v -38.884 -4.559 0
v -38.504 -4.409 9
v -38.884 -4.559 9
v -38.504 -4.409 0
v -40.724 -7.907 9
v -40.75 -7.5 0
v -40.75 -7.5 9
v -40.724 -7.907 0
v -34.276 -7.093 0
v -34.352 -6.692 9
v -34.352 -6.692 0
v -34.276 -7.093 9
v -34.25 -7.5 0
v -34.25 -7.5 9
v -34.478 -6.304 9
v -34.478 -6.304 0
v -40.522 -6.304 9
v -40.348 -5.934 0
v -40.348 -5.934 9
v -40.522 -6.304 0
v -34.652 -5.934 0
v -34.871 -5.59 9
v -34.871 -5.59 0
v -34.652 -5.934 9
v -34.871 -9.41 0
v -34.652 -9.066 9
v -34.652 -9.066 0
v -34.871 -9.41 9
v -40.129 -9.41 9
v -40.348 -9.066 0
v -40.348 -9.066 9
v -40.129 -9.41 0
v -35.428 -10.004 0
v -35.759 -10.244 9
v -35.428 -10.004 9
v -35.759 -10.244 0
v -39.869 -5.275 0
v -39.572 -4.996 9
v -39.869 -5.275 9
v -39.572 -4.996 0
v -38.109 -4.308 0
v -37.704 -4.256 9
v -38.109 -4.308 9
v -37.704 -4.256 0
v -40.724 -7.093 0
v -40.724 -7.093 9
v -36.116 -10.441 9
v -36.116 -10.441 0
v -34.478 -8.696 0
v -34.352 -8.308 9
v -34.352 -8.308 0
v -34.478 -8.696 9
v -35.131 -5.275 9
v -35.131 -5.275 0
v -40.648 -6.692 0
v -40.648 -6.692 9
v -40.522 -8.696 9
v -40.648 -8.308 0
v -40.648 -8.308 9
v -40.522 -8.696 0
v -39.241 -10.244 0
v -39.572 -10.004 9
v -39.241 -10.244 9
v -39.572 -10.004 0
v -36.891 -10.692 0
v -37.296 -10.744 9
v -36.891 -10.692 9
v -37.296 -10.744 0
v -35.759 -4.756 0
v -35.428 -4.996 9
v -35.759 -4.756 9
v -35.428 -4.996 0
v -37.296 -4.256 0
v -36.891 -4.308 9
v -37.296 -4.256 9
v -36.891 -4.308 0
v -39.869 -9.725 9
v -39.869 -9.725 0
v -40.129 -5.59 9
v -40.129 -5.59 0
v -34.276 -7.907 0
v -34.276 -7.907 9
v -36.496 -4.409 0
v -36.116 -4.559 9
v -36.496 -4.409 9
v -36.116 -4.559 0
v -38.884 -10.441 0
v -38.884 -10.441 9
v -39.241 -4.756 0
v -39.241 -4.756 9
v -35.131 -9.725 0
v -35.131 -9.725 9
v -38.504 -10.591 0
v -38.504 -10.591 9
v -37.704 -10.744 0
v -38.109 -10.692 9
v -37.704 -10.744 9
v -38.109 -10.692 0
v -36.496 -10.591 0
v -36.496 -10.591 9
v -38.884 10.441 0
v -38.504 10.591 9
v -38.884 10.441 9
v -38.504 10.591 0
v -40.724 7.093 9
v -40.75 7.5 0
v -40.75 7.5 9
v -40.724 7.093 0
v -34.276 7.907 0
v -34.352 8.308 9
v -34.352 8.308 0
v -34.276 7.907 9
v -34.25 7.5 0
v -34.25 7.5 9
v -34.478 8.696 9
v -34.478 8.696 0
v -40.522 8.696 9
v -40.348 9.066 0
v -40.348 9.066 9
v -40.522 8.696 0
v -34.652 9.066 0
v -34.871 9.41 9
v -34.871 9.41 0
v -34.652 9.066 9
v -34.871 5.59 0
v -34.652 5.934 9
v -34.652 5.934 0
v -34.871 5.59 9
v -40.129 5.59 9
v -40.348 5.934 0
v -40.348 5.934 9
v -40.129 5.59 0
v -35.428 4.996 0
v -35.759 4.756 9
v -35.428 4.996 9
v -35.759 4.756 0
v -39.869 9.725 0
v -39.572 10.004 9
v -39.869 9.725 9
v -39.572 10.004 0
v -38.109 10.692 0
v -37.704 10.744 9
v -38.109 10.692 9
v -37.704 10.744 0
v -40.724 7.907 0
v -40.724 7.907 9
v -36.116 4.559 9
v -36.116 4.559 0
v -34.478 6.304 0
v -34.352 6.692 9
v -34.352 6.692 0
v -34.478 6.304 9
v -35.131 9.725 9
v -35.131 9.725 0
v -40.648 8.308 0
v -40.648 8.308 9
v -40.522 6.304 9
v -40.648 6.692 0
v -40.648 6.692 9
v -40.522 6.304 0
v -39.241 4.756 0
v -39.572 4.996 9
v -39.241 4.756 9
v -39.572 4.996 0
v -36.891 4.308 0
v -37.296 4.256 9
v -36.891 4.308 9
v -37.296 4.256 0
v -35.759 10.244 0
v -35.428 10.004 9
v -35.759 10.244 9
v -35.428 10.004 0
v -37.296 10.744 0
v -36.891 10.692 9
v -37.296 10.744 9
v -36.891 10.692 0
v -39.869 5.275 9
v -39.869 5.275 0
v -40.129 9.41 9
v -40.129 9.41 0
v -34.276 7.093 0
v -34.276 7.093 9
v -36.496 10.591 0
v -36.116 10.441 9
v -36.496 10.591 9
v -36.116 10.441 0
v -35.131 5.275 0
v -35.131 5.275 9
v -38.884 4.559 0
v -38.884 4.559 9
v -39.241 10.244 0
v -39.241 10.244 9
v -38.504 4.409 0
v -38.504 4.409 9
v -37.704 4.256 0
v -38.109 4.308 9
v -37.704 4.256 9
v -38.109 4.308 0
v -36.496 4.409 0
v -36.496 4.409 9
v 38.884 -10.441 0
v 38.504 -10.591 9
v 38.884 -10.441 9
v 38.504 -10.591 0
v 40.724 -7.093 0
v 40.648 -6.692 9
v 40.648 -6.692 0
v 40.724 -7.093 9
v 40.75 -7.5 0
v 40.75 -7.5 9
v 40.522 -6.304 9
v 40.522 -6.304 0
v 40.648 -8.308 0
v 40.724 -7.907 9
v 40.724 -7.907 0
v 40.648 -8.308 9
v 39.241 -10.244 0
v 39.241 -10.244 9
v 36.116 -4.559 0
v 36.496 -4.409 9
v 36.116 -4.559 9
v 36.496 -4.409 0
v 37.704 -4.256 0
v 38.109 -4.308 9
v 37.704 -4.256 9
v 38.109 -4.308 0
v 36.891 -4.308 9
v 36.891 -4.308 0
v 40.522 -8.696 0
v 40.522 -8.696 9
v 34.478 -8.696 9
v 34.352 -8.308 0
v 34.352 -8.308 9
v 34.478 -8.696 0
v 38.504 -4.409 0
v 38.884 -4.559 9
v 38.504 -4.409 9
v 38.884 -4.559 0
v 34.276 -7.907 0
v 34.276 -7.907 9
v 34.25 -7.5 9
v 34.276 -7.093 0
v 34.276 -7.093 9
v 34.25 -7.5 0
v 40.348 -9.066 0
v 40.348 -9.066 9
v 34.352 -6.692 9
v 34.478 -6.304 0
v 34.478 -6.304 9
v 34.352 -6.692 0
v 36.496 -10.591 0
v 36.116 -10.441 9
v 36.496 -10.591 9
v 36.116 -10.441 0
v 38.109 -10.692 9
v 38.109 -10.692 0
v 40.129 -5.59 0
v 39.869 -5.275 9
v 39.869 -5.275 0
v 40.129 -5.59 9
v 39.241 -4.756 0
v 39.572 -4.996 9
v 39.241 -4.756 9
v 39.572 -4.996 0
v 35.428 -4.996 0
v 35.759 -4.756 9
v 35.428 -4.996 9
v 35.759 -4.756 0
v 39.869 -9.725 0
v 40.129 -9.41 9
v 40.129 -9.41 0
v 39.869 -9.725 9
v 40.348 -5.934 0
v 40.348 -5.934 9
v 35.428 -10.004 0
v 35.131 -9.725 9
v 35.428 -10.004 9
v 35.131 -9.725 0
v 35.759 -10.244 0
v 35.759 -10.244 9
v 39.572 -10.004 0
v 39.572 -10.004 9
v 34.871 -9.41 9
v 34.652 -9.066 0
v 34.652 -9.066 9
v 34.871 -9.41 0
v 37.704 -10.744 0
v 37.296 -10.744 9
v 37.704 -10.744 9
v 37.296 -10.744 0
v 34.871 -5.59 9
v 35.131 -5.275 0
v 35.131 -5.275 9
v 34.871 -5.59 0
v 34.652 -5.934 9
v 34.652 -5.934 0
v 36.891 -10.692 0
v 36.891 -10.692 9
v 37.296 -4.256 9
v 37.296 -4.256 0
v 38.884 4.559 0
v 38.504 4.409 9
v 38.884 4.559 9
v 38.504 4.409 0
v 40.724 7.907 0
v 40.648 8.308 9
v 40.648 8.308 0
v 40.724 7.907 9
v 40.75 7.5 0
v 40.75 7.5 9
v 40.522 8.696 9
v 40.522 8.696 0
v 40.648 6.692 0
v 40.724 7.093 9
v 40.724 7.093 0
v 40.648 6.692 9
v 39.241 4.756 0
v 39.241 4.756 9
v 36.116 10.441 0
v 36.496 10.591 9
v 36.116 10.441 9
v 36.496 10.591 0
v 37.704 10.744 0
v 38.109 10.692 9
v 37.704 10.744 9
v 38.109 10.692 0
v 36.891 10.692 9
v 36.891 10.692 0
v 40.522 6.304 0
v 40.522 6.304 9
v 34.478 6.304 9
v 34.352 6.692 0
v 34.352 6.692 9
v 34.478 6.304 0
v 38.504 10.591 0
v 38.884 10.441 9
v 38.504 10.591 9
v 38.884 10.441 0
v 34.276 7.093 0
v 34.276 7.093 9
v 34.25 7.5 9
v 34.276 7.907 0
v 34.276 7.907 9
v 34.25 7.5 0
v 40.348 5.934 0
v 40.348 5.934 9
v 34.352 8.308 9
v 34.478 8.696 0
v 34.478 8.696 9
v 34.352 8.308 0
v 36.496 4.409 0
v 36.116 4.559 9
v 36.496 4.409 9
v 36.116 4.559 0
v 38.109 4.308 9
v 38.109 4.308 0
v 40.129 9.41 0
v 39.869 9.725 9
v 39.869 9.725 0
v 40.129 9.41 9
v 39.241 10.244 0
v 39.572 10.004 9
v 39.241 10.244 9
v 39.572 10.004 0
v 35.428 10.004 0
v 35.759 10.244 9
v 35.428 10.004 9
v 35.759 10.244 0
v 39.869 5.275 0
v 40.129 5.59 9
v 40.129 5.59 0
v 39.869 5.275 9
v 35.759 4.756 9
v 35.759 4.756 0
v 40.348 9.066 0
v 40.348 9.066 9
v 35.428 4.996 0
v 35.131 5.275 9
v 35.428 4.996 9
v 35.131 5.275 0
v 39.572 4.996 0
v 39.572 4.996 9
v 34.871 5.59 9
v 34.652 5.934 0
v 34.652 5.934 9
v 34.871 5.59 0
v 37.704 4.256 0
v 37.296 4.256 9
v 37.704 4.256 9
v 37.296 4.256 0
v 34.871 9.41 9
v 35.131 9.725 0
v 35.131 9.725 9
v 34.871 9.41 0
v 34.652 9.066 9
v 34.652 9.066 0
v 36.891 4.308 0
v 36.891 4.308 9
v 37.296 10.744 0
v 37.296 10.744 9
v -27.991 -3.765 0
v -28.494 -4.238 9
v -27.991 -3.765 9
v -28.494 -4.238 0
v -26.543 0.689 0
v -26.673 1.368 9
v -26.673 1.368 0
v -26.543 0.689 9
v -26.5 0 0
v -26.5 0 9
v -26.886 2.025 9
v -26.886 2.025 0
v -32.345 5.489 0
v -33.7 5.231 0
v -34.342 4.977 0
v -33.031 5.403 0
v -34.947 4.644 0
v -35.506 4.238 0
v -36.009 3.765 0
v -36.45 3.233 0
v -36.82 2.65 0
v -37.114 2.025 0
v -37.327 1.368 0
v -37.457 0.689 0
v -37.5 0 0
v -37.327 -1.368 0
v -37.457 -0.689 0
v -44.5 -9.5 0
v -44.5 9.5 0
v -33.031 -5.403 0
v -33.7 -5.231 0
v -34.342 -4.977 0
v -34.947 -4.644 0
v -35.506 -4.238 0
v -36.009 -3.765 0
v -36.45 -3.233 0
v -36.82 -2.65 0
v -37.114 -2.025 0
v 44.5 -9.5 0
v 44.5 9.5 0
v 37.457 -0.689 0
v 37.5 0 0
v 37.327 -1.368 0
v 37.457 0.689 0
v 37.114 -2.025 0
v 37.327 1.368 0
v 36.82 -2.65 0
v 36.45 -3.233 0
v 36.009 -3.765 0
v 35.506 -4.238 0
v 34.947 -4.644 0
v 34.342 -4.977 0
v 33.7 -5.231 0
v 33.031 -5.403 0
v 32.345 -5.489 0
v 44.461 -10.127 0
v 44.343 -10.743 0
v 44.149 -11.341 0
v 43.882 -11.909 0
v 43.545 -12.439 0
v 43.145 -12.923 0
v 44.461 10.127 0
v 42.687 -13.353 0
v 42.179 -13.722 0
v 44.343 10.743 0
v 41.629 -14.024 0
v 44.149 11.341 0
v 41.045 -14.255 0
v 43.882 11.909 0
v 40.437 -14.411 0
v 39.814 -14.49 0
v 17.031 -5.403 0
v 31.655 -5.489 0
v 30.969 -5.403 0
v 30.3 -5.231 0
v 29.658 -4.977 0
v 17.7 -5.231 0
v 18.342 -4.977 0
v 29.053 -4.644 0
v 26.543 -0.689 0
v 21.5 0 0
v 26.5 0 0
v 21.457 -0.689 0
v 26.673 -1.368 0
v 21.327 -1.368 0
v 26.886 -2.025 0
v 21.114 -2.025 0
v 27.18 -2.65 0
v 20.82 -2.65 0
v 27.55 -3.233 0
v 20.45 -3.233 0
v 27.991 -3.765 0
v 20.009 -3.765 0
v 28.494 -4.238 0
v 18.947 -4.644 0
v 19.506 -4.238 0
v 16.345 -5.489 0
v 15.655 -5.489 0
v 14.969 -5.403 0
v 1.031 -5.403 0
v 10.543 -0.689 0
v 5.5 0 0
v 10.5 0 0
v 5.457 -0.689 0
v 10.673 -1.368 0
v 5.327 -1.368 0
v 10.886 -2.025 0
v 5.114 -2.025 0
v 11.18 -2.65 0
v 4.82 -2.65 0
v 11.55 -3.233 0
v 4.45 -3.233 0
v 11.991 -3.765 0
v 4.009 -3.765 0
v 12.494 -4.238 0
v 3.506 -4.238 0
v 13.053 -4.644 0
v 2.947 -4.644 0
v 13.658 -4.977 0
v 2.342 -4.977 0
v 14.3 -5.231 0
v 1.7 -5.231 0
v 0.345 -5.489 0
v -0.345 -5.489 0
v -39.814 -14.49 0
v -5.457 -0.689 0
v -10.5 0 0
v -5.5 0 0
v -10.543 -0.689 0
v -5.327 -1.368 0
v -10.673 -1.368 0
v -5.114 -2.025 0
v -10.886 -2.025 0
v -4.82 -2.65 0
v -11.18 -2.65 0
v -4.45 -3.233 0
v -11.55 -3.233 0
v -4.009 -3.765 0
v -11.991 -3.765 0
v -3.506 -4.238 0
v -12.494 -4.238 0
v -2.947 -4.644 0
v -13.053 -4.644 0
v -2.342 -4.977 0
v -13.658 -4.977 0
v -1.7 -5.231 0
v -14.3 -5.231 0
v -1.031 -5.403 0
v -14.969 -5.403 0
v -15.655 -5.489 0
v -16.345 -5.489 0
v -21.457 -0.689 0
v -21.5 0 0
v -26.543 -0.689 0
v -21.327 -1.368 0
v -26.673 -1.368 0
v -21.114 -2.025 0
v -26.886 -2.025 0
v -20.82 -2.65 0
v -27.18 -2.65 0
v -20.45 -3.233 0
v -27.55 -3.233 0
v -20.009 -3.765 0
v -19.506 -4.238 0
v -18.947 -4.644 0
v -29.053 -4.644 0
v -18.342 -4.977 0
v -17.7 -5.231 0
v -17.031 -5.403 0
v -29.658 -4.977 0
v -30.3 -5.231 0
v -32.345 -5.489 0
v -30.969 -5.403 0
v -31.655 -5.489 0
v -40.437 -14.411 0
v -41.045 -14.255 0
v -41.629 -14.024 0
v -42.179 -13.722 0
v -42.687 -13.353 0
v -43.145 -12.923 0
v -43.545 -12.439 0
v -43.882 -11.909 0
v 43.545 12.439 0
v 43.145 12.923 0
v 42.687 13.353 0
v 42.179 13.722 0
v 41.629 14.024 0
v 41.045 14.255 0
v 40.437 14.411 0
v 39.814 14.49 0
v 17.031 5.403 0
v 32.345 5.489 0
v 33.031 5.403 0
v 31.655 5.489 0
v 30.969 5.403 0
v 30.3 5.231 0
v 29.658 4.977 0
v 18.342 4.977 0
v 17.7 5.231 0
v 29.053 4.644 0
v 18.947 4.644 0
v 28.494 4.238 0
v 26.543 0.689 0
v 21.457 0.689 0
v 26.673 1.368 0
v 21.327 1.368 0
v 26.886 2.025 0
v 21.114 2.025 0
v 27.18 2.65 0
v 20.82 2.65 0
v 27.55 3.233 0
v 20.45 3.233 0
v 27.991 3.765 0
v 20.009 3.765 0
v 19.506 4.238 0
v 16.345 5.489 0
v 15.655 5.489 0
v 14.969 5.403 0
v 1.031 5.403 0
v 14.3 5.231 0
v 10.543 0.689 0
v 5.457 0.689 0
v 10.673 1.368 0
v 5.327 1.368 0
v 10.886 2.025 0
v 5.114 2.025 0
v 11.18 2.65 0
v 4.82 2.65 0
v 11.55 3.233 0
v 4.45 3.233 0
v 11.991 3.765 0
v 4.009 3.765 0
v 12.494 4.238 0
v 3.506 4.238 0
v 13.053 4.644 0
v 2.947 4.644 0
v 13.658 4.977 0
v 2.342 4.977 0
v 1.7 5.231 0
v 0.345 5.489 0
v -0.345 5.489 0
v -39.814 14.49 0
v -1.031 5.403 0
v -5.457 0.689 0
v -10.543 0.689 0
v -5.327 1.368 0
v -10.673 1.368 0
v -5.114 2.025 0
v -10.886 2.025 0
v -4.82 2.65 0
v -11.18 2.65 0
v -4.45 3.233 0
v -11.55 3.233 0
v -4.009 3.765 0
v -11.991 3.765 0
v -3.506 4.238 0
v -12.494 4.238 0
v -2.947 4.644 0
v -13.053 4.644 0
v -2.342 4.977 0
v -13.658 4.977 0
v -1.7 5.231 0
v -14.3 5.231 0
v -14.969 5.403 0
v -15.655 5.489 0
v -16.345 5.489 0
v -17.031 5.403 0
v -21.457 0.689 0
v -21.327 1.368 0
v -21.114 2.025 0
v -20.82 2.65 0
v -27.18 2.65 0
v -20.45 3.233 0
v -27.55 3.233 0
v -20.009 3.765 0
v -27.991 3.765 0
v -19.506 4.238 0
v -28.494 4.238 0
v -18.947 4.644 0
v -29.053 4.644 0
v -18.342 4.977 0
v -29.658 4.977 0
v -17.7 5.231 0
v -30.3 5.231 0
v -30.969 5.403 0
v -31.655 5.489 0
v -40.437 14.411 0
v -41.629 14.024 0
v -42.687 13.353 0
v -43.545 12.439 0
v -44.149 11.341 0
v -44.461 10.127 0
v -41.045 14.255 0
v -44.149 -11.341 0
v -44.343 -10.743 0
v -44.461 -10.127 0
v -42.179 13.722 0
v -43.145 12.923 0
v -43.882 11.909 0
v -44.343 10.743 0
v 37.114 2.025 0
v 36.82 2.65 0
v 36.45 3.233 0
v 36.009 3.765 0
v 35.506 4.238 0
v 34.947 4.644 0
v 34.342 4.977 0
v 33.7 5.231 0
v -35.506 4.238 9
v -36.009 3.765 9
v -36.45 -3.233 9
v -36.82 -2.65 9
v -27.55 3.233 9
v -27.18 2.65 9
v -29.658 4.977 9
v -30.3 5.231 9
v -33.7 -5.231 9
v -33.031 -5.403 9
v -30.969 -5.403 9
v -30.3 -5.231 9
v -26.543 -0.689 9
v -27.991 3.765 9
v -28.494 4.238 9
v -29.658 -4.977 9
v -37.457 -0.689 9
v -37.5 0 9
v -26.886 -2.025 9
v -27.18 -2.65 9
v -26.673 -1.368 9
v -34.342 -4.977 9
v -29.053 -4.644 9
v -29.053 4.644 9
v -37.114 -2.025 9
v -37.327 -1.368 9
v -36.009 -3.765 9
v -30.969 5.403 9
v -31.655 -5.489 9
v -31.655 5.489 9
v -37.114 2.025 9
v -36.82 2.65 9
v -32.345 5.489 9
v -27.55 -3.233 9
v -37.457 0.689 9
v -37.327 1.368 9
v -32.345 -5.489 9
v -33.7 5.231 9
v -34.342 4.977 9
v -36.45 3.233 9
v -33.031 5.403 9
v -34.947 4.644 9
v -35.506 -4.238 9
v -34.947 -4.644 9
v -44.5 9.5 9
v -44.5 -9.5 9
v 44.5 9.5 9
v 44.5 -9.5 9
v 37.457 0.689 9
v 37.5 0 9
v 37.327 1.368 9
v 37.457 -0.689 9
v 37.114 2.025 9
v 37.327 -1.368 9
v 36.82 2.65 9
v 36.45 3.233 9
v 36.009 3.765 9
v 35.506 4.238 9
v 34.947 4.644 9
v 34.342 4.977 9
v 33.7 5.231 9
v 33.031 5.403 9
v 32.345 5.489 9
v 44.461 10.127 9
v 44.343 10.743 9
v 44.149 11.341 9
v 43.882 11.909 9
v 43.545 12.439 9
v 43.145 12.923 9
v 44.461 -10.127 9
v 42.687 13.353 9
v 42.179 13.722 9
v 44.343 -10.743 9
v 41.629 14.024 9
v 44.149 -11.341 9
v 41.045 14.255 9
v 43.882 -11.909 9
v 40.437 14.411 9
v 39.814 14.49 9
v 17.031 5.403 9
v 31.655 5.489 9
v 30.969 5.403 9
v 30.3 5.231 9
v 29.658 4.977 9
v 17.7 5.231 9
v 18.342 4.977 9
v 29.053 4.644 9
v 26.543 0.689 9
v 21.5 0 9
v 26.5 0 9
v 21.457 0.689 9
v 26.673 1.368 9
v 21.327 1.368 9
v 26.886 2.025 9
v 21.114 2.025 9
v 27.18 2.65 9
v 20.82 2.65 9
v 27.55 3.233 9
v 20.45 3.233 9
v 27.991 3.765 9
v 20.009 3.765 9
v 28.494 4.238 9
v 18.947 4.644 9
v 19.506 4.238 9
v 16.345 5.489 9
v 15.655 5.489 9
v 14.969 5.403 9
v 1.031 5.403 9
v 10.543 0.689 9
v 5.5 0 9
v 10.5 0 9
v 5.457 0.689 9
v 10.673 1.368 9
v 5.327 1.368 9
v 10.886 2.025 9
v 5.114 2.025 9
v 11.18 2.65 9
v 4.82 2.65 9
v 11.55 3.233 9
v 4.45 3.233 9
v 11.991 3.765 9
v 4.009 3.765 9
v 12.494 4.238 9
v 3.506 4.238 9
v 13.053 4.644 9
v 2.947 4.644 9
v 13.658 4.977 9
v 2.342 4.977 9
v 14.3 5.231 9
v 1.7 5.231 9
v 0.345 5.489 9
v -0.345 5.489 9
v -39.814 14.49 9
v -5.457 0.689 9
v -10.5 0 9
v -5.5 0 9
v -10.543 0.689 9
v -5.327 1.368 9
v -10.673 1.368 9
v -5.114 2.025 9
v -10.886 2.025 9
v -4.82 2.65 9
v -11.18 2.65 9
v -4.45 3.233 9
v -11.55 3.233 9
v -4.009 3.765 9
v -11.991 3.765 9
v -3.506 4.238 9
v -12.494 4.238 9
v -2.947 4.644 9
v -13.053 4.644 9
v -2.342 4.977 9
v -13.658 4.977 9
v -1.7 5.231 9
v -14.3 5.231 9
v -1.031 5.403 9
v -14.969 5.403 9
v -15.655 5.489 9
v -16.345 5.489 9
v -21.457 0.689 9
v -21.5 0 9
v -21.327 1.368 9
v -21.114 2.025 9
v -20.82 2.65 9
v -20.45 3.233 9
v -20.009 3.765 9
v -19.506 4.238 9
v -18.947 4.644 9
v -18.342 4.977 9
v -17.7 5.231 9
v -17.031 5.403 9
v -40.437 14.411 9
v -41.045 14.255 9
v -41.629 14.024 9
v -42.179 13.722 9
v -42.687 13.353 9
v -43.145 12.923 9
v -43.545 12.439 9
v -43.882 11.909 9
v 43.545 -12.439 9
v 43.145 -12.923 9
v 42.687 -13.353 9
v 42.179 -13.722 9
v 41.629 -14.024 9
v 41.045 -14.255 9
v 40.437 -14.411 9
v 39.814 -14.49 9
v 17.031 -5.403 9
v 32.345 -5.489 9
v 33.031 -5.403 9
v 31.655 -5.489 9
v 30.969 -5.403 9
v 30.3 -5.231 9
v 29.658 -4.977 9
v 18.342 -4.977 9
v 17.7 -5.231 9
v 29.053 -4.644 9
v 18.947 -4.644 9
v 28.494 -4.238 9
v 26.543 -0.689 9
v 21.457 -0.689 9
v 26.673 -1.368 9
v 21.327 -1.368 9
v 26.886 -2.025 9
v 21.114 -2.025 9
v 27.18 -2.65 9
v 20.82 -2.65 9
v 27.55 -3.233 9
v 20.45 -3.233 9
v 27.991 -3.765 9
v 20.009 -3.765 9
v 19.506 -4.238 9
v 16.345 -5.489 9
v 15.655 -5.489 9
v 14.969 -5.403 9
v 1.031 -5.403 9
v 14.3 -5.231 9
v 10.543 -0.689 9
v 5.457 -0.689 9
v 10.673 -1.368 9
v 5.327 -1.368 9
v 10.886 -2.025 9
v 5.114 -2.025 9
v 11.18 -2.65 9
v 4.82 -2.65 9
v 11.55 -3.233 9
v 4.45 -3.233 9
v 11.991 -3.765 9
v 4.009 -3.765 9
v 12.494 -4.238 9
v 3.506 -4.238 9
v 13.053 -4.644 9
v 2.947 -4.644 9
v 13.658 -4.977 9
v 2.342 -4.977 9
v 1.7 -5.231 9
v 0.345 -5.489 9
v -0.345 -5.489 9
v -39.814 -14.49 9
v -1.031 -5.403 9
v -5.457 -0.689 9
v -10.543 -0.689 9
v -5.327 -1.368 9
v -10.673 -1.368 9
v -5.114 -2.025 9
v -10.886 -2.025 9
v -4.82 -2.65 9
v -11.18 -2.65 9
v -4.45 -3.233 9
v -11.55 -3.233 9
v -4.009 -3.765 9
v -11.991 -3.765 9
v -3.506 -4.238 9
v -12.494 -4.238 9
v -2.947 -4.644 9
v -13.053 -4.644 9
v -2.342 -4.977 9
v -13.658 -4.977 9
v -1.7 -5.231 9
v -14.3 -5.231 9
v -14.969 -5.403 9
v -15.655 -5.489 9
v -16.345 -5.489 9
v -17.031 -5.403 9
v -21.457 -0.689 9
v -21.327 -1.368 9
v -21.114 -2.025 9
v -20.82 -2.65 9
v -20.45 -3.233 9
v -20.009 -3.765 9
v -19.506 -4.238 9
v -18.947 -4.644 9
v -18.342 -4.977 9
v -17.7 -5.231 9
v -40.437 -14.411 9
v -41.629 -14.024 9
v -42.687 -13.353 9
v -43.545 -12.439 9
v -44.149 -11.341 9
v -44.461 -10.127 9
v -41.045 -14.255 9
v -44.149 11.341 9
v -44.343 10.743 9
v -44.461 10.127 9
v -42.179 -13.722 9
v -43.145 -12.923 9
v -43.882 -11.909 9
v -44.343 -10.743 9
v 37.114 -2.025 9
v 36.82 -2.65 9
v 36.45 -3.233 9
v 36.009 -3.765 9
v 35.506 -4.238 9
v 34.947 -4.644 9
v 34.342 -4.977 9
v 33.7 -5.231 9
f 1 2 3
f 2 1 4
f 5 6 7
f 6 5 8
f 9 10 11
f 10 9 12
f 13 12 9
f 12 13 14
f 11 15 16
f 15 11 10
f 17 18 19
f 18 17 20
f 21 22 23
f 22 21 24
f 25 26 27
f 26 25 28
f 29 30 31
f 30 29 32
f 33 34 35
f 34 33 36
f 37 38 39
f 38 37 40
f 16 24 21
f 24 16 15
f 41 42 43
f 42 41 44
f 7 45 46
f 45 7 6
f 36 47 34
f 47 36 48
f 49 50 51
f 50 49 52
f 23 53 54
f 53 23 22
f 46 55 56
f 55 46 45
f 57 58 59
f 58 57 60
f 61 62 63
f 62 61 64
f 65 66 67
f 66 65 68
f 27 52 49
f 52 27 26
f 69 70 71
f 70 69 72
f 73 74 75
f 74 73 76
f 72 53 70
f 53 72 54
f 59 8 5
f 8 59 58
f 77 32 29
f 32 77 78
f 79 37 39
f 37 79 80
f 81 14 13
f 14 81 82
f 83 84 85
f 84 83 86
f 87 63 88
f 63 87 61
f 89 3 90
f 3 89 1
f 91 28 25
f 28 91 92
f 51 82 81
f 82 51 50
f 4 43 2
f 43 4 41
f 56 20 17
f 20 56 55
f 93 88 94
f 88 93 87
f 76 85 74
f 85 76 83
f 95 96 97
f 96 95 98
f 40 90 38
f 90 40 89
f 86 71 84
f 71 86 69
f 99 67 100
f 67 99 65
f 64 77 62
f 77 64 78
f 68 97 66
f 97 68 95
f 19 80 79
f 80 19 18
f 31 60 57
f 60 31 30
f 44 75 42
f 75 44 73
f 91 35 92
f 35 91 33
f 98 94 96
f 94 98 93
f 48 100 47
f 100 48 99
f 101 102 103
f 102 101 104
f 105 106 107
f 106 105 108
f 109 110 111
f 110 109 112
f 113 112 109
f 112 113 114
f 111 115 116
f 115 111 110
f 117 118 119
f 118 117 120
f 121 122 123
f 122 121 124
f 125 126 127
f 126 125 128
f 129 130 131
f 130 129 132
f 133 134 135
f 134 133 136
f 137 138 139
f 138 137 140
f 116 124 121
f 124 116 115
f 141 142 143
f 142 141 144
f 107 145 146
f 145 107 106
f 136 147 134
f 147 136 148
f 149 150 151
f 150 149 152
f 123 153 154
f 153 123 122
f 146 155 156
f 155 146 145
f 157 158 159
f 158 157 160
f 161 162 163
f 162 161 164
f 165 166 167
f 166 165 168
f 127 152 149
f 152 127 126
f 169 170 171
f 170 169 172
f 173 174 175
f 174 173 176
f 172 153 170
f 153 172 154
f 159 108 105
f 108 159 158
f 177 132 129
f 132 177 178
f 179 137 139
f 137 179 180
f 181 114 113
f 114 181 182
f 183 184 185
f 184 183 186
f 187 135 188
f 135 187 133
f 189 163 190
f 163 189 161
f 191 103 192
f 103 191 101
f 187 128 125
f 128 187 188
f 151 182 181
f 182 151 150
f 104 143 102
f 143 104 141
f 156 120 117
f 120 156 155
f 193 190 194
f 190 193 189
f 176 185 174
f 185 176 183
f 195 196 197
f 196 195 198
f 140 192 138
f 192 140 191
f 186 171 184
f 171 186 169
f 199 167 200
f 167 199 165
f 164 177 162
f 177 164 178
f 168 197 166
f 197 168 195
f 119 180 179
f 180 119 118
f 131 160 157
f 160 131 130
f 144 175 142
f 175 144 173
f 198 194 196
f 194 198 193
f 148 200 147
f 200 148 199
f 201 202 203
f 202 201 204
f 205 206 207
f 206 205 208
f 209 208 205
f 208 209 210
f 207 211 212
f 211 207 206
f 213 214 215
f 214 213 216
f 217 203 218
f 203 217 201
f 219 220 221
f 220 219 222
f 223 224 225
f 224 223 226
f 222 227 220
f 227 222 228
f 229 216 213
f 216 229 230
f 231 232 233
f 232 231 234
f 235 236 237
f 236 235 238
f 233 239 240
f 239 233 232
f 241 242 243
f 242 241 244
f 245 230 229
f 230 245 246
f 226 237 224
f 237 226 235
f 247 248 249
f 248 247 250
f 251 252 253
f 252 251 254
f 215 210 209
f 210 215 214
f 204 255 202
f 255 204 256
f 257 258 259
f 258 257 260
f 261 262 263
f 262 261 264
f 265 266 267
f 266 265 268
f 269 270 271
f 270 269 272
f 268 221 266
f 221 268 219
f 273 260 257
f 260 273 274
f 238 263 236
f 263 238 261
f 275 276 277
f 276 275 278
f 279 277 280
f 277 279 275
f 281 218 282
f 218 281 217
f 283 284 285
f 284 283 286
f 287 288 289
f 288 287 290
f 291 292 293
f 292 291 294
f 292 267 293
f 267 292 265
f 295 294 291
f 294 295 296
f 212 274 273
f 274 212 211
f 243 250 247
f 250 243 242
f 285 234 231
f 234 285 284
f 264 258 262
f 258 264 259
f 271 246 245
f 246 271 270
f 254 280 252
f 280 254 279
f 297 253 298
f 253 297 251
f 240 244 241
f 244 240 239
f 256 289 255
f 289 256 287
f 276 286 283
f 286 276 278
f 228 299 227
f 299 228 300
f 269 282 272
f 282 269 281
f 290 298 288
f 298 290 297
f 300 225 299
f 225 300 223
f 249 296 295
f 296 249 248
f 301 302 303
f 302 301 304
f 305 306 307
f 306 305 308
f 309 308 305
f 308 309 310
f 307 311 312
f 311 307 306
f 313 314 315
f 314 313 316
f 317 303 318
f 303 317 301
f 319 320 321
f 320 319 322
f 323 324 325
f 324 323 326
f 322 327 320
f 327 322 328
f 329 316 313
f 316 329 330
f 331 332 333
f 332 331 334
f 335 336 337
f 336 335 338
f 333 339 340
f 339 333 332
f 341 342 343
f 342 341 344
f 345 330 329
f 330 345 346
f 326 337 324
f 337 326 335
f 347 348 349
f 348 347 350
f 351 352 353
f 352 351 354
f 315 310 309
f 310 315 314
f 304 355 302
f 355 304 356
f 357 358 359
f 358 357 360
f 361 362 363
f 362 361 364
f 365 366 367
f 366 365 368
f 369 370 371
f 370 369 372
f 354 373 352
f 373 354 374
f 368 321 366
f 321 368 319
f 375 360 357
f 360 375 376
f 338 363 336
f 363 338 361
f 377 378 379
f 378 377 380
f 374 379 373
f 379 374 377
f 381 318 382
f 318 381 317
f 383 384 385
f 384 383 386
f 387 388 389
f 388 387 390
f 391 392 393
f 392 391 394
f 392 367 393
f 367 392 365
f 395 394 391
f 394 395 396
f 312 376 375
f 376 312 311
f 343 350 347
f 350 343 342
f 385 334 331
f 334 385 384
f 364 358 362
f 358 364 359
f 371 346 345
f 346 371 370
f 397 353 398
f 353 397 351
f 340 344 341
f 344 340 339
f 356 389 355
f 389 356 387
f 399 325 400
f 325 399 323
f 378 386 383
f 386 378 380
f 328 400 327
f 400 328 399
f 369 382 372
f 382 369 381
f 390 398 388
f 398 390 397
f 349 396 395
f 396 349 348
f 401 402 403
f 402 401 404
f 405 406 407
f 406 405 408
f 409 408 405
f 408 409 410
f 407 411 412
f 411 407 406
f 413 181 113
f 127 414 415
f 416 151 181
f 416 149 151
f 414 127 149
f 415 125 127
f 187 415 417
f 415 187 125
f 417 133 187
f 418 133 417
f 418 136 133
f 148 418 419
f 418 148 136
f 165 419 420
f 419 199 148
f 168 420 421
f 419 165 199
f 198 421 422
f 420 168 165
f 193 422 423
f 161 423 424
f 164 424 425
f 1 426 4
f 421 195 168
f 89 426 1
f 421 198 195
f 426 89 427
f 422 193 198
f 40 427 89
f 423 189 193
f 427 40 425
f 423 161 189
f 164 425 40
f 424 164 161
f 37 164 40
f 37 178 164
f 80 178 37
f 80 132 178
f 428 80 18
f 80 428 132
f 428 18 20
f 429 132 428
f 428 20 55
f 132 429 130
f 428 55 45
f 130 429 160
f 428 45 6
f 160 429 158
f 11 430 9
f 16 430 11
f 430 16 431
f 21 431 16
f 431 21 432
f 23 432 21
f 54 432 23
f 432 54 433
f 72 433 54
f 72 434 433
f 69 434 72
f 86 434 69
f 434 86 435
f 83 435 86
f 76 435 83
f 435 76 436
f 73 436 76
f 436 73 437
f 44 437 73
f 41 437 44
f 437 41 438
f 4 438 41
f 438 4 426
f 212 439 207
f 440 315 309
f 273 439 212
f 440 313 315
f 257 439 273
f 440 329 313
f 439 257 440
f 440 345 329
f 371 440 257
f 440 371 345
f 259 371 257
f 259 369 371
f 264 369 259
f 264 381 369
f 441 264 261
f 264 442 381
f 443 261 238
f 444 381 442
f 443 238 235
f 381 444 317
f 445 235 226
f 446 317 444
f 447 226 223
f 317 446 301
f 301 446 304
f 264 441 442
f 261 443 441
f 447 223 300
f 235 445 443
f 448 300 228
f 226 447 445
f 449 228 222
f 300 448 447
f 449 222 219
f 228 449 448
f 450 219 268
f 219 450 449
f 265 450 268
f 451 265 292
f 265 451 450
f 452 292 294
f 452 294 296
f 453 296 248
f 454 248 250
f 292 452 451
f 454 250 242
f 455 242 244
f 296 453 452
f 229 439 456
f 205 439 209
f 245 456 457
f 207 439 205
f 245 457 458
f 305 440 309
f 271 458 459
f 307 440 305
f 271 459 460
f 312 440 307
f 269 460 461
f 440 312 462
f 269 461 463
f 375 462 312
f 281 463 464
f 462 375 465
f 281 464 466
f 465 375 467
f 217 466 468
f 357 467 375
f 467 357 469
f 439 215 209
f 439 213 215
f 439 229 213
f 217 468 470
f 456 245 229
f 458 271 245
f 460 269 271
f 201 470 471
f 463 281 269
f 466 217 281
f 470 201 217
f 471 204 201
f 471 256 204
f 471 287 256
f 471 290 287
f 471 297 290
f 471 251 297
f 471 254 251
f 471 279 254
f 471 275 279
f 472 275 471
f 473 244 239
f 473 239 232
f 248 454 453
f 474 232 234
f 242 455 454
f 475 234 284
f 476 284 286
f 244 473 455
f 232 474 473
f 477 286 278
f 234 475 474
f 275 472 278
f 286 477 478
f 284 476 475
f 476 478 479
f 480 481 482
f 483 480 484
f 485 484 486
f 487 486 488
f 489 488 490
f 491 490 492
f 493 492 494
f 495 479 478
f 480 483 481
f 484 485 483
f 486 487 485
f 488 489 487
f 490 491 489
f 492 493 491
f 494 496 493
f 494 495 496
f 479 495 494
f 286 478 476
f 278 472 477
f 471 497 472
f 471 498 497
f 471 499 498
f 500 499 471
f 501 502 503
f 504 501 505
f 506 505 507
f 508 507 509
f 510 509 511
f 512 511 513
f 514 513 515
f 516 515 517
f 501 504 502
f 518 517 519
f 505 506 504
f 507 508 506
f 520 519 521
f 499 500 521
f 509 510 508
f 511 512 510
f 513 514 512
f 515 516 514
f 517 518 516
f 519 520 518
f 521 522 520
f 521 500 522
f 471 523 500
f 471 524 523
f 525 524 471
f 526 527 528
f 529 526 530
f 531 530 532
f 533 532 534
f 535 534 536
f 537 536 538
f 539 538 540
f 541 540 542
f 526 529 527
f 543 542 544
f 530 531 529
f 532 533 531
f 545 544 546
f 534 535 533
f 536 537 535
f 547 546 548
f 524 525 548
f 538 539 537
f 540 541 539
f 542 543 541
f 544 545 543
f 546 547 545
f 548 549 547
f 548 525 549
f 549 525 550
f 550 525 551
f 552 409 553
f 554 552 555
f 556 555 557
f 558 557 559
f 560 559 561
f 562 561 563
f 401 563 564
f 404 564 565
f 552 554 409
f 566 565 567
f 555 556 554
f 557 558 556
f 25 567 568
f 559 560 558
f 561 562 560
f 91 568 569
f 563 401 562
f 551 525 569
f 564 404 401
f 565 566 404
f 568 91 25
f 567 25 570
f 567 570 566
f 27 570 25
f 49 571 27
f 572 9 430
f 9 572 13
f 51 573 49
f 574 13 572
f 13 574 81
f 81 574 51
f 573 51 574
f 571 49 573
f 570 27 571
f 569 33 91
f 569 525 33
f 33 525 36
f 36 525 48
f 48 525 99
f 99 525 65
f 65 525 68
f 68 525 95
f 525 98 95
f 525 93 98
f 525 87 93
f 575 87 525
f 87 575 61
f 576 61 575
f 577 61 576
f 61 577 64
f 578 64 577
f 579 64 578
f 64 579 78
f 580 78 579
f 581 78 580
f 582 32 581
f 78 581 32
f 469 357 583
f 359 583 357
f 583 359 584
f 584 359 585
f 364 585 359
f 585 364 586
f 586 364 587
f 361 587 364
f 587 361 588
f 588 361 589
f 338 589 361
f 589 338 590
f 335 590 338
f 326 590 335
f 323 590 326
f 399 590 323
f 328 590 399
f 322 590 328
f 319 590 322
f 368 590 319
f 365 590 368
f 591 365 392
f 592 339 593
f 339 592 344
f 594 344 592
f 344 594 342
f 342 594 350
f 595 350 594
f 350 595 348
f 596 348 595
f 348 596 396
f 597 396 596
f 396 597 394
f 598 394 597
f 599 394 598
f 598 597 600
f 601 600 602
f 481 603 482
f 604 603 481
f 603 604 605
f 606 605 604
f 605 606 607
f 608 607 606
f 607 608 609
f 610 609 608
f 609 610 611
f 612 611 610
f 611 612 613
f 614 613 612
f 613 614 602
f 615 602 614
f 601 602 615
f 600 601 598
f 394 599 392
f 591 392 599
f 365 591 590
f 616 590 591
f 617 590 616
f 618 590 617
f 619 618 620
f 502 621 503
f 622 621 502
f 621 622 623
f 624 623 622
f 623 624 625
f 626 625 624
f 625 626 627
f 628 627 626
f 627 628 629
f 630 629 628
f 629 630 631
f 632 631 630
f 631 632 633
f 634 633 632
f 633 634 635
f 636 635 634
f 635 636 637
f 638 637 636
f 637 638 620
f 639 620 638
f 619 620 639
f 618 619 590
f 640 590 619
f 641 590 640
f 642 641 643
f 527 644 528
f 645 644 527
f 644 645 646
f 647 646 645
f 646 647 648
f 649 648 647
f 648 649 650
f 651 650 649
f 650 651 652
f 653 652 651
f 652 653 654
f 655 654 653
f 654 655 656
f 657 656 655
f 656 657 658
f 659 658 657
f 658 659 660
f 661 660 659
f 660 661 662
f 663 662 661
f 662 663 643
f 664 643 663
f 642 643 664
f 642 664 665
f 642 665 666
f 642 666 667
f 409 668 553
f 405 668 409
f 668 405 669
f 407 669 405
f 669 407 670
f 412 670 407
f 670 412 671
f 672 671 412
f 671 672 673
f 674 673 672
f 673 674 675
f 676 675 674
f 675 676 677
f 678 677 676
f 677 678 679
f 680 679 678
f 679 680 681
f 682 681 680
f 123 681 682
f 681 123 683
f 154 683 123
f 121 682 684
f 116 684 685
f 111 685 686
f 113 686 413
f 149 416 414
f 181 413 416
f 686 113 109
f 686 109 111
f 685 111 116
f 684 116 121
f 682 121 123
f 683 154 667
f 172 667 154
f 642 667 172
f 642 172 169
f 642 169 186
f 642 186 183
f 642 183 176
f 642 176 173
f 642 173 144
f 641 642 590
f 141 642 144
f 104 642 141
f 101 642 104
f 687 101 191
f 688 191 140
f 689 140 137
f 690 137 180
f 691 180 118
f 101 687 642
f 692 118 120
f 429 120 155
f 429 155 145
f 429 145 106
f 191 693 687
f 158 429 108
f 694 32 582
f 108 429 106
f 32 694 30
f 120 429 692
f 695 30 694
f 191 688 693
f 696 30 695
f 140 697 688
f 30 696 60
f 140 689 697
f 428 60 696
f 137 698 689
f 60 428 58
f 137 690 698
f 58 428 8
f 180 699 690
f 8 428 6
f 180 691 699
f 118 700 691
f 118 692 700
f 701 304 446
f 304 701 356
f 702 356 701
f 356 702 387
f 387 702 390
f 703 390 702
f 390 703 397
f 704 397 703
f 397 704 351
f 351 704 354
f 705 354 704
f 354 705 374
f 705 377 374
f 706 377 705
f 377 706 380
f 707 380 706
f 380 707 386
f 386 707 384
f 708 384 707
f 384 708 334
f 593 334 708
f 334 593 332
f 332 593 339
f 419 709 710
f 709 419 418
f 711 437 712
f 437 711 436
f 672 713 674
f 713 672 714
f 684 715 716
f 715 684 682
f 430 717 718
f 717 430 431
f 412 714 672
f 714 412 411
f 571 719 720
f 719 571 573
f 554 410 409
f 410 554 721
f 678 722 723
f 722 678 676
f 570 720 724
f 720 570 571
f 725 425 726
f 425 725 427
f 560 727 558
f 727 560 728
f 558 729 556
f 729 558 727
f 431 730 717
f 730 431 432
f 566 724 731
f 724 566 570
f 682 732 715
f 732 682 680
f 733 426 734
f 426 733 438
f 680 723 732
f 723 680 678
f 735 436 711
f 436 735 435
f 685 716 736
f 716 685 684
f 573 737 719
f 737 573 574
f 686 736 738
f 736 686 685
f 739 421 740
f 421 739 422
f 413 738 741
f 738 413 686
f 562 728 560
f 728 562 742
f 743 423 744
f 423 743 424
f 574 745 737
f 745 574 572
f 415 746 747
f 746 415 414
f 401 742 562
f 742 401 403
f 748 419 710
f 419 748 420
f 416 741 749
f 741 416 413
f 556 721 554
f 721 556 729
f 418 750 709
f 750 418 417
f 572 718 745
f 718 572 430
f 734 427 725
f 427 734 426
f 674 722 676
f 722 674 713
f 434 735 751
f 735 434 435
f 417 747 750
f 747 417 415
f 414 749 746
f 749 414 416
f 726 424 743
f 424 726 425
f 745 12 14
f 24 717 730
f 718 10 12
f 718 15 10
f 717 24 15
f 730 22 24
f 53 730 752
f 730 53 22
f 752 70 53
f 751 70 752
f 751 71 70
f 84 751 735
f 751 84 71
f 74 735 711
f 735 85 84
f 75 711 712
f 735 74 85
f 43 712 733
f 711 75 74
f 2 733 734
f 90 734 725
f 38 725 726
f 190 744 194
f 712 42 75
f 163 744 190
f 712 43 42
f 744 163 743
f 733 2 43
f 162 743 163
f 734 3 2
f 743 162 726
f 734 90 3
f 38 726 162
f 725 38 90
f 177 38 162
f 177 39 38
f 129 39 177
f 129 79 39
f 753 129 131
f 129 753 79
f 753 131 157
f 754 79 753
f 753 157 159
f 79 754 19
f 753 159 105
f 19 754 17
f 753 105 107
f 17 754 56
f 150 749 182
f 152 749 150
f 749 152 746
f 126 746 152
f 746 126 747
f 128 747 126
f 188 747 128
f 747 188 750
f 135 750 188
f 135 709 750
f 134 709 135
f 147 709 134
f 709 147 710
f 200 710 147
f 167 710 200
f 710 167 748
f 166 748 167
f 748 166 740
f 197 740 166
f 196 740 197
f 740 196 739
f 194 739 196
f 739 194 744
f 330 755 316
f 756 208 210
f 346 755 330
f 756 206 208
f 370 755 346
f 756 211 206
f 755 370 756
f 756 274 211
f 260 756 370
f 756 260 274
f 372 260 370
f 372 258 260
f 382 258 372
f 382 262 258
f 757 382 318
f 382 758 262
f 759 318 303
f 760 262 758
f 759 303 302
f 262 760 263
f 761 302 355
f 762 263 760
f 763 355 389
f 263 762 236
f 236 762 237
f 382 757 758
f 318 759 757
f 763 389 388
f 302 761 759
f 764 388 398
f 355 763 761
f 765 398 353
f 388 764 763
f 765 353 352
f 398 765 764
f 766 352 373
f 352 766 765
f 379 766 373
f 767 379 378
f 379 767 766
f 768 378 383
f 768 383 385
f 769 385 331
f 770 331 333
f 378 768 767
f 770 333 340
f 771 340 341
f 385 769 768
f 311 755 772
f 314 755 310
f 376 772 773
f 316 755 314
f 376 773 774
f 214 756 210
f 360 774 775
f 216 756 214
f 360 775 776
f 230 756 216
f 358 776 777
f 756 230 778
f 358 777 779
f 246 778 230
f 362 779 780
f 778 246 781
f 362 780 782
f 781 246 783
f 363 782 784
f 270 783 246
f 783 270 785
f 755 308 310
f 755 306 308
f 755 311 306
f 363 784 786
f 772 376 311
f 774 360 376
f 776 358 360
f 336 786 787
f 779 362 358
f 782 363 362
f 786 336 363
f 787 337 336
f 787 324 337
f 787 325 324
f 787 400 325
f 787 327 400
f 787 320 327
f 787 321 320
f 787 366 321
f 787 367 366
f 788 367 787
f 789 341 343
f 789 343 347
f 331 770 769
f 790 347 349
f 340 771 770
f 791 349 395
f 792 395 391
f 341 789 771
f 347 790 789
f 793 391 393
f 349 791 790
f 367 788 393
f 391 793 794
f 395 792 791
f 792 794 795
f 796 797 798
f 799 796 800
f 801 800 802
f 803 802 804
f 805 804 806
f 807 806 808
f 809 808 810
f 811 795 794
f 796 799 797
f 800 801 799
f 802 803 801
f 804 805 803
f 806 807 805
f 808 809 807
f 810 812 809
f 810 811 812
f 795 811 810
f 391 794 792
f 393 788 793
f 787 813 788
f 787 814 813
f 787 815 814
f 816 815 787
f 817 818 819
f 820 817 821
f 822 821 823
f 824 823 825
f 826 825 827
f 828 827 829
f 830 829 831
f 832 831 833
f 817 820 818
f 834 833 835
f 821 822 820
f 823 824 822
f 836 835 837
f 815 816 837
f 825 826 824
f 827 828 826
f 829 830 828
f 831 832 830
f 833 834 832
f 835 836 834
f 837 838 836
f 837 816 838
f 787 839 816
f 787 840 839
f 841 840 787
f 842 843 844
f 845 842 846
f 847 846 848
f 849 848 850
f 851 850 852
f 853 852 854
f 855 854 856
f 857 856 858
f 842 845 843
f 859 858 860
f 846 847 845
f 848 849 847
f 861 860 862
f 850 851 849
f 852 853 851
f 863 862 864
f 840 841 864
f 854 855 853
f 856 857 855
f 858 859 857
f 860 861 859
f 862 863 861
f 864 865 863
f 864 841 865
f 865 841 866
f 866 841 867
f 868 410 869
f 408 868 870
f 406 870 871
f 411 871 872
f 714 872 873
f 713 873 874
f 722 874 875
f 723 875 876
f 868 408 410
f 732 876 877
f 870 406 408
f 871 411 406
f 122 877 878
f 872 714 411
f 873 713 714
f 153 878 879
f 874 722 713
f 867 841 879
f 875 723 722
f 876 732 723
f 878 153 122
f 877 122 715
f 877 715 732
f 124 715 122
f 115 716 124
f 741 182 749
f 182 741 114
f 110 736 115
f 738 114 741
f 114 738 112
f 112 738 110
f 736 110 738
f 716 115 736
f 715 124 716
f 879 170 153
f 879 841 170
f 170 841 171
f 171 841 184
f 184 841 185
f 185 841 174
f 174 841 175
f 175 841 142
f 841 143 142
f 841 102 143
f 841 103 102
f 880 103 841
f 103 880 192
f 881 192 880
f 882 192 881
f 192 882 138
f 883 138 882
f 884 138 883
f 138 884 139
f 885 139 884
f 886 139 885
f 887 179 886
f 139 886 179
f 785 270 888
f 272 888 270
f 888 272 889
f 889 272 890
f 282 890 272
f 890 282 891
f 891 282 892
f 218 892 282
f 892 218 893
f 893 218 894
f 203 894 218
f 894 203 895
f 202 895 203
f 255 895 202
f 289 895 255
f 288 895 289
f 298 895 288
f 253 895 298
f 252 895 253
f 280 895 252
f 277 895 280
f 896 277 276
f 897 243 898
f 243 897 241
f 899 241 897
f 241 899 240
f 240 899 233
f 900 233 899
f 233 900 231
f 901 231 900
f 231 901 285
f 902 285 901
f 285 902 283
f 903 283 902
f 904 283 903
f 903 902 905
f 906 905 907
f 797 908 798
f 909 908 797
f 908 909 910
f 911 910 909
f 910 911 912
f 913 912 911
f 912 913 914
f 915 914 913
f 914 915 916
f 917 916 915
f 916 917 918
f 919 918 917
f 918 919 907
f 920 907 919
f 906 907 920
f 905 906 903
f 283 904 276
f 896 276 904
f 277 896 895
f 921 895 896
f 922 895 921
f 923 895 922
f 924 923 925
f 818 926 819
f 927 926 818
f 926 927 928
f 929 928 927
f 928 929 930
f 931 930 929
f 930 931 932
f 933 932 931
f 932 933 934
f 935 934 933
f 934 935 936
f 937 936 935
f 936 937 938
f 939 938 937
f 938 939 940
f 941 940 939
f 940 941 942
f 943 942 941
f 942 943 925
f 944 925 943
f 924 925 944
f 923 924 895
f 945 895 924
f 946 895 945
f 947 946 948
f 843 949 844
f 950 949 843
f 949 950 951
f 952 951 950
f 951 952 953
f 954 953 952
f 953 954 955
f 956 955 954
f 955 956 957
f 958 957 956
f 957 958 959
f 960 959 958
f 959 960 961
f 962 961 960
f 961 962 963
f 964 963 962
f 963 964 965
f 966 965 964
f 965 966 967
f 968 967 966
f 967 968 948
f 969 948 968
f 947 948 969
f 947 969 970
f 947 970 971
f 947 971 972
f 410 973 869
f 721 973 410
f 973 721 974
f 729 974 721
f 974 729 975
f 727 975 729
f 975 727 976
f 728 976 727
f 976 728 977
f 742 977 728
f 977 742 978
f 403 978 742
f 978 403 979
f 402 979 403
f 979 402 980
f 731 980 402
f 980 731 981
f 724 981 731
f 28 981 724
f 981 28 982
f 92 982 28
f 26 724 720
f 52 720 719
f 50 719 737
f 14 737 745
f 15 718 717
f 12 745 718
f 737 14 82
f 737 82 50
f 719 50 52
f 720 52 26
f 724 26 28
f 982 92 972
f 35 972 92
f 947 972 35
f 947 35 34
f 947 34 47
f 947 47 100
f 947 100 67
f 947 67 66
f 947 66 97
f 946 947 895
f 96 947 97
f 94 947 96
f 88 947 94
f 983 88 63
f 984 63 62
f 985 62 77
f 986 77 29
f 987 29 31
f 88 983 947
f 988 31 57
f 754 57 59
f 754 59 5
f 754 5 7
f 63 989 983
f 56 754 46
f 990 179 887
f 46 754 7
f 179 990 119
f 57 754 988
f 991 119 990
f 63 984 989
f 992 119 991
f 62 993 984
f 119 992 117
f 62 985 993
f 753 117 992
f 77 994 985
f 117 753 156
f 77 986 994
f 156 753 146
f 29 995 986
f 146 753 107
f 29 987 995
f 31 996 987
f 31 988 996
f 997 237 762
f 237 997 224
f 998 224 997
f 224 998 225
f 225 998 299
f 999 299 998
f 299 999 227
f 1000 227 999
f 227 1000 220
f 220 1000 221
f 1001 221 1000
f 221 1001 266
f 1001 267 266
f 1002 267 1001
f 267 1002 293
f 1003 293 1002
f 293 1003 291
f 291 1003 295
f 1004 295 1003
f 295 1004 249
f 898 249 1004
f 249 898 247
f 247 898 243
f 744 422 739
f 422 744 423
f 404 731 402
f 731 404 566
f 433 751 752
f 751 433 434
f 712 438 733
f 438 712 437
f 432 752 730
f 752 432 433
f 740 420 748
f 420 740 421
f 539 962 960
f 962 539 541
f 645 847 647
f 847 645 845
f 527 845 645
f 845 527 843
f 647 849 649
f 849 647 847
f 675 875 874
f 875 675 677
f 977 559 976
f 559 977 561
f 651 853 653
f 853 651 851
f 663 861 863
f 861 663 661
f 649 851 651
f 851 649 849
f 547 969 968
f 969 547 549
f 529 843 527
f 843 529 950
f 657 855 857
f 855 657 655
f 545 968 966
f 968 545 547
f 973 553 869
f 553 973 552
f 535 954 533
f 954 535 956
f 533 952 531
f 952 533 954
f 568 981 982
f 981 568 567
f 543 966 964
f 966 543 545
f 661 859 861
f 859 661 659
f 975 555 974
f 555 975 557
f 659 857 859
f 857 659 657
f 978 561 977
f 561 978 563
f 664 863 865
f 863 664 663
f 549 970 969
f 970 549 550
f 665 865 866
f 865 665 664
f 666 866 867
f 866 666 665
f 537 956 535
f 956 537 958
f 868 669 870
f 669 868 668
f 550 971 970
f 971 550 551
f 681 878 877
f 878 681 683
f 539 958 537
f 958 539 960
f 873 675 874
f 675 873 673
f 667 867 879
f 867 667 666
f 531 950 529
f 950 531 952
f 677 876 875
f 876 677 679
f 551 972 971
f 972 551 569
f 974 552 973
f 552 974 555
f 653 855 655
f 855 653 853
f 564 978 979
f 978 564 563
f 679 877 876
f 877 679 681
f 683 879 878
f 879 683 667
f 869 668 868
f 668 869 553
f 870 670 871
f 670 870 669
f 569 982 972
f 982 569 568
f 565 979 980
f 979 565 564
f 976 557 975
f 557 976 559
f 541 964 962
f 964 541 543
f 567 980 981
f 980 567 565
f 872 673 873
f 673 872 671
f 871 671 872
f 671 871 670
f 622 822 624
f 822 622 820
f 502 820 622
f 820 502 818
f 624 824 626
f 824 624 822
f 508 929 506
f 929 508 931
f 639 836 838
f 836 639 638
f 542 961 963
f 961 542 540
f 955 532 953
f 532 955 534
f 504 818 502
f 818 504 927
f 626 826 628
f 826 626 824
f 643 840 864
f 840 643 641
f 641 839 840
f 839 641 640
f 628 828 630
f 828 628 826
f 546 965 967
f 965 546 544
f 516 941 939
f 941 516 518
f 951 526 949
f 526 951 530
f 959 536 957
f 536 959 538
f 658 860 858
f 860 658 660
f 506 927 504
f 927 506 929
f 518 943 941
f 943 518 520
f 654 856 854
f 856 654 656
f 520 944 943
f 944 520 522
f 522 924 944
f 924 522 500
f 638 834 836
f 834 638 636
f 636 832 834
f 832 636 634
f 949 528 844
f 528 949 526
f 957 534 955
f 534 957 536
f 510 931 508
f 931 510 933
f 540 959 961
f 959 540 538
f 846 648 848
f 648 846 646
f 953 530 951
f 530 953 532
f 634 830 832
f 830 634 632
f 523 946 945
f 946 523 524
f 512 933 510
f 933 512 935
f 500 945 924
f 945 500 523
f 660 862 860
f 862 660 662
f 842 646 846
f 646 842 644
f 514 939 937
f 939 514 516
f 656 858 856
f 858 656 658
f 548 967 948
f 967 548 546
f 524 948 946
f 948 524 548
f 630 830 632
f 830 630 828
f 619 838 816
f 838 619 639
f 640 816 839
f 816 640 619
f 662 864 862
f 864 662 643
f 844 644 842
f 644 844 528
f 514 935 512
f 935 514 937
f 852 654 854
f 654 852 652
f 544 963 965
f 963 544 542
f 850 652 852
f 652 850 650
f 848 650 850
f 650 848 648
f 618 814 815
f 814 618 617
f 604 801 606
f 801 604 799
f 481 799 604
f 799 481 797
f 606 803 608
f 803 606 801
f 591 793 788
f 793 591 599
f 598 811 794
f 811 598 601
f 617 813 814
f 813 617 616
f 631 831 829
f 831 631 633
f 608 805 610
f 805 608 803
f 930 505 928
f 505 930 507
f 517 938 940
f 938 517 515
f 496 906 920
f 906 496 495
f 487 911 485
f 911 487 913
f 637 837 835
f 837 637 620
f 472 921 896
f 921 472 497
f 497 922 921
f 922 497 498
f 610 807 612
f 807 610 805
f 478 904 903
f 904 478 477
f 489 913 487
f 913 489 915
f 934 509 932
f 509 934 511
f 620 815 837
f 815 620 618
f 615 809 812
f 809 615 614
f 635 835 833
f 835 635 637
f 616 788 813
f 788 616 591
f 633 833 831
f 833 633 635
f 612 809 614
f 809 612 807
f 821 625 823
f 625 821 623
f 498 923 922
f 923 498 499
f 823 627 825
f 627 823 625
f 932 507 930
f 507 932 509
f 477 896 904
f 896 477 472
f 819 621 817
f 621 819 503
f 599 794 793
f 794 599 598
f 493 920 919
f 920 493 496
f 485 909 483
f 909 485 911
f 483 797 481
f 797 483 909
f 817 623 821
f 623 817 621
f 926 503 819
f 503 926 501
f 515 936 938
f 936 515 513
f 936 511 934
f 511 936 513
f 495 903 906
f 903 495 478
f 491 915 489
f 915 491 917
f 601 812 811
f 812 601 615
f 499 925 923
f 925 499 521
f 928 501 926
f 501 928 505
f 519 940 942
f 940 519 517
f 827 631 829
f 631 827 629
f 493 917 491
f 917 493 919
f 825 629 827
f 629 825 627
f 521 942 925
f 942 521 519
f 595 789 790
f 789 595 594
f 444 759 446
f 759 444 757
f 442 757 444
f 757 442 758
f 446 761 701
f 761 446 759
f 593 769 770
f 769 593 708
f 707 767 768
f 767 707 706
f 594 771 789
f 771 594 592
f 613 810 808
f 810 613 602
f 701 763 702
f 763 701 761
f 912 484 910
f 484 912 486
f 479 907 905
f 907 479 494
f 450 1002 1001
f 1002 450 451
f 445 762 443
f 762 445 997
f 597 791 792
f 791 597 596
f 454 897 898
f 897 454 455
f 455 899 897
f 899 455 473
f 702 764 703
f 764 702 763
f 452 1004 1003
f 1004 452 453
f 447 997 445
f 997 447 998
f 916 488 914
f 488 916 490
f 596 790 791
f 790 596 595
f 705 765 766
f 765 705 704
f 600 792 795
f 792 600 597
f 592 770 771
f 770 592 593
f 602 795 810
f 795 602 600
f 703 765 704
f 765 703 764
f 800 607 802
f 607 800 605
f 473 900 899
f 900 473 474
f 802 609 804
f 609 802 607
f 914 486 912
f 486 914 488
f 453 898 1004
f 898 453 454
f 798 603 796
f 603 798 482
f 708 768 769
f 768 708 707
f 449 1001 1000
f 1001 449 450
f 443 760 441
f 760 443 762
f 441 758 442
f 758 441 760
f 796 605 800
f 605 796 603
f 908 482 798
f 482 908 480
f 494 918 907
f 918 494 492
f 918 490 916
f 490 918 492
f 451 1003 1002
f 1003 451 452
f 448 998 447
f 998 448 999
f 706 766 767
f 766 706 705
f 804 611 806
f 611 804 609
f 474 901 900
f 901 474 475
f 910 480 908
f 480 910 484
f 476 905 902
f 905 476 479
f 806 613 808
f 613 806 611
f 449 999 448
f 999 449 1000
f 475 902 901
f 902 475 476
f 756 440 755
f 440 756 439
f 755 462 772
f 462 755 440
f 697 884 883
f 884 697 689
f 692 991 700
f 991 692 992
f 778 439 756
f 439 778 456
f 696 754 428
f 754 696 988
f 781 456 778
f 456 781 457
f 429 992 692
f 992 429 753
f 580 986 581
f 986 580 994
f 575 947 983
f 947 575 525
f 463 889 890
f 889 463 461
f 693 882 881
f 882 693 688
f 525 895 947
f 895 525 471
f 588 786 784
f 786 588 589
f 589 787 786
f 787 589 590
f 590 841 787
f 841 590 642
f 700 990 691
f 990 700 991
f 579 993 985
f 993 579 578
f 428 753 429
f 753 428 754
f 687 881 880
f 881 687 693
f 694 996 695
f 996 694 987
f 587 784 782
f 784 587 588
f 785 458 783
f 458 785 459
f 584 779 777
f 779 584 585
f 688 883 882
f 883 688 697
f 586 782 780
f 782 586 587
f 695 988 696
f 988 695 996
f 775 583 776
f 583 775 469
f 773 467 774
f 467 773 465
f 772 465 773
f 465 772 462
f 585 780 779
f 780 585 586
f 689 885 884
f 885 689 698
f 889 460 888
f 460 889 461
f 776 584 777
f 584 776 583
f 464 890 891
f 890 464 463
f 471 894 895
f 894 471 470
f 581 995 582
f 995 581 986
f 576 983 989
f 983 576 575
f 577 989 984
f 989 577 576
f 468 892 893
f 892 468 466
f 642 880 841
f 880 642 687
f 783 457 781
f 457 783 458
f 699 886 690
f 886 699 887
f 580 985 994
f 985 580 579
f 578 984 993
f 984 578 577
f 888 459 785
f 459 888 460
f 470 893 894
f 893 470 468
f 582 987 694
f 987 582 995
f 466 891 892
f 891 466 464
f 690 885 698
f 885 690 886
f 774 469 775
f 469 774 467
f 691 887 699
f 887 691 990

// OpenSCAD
$fn = 50;

difference() {
	union() {
		hull() {
			translate(v = [-39.5, 9.5, 0]) {
				cylinder(h = 9, r = 5);
			}
			translate(v = [39.5, 9.5, 0]) {
				cylinder(h = 9, r = 5);
			}
			translate(v = [-39.5, -9.5, 0]) {
				cylinder(h = 9, r = 5);
			}
			translate(v = [39.5, -9.5, 0]) {
				cylinder(h = 9, r = 5);
			}
		}
	}
	union() {
		translate(v = [-37.5, -7.5, -100.0]) {
			cylinder(h = 200, r = 3.25);
		}
		translate(v = [-37.5, 7.5, -100.0]) {
			cylinder(h = 200, r = 3.25);
		}
		translate(v = [37.5, -7.5, -100.0]) {
			cylinder(h = 200, r = 3.25);
		}
		translate(v = [37.5, 7.5, -100.0]) {
			cylinder(h = 200, r = 3.25);
		}
		translate(v = [-37.5, -7.5, -100.0]) {
			cylinder(h = 200, r = 1.8);
		}
		translate(v = [-37.5, 7.5, -100.0]) {
			cylinder(h = 200, r = 1.8);
		}
		translate(v = [37.5, -7.5, -100.0]) {
			cylinder(h = 200, r = 1.8);
		}
		translate(v = [37.5, 7.5, -100.0]) {
			cylinder(h = 200, r = 1.8);
		}
		translate(v = [-32.0, 0, 0.0]) {
			cylinder(h = 9, r = 5.5);
		}
		translate(v = [-16.0, 0, 0.0]) {
			cylinder(h = 9, r = 5.5);
		}
		cylinder(h = 9, r = 5.5);
		translate(v = [16.0, 0, 0.0]) {
			cylinder(h = 9, r = 5.5);
		}
		translate(v = [32.0, 0, 0.0]) {
			cylinder(h = 9, r = 5.5);
		}
	}
}
